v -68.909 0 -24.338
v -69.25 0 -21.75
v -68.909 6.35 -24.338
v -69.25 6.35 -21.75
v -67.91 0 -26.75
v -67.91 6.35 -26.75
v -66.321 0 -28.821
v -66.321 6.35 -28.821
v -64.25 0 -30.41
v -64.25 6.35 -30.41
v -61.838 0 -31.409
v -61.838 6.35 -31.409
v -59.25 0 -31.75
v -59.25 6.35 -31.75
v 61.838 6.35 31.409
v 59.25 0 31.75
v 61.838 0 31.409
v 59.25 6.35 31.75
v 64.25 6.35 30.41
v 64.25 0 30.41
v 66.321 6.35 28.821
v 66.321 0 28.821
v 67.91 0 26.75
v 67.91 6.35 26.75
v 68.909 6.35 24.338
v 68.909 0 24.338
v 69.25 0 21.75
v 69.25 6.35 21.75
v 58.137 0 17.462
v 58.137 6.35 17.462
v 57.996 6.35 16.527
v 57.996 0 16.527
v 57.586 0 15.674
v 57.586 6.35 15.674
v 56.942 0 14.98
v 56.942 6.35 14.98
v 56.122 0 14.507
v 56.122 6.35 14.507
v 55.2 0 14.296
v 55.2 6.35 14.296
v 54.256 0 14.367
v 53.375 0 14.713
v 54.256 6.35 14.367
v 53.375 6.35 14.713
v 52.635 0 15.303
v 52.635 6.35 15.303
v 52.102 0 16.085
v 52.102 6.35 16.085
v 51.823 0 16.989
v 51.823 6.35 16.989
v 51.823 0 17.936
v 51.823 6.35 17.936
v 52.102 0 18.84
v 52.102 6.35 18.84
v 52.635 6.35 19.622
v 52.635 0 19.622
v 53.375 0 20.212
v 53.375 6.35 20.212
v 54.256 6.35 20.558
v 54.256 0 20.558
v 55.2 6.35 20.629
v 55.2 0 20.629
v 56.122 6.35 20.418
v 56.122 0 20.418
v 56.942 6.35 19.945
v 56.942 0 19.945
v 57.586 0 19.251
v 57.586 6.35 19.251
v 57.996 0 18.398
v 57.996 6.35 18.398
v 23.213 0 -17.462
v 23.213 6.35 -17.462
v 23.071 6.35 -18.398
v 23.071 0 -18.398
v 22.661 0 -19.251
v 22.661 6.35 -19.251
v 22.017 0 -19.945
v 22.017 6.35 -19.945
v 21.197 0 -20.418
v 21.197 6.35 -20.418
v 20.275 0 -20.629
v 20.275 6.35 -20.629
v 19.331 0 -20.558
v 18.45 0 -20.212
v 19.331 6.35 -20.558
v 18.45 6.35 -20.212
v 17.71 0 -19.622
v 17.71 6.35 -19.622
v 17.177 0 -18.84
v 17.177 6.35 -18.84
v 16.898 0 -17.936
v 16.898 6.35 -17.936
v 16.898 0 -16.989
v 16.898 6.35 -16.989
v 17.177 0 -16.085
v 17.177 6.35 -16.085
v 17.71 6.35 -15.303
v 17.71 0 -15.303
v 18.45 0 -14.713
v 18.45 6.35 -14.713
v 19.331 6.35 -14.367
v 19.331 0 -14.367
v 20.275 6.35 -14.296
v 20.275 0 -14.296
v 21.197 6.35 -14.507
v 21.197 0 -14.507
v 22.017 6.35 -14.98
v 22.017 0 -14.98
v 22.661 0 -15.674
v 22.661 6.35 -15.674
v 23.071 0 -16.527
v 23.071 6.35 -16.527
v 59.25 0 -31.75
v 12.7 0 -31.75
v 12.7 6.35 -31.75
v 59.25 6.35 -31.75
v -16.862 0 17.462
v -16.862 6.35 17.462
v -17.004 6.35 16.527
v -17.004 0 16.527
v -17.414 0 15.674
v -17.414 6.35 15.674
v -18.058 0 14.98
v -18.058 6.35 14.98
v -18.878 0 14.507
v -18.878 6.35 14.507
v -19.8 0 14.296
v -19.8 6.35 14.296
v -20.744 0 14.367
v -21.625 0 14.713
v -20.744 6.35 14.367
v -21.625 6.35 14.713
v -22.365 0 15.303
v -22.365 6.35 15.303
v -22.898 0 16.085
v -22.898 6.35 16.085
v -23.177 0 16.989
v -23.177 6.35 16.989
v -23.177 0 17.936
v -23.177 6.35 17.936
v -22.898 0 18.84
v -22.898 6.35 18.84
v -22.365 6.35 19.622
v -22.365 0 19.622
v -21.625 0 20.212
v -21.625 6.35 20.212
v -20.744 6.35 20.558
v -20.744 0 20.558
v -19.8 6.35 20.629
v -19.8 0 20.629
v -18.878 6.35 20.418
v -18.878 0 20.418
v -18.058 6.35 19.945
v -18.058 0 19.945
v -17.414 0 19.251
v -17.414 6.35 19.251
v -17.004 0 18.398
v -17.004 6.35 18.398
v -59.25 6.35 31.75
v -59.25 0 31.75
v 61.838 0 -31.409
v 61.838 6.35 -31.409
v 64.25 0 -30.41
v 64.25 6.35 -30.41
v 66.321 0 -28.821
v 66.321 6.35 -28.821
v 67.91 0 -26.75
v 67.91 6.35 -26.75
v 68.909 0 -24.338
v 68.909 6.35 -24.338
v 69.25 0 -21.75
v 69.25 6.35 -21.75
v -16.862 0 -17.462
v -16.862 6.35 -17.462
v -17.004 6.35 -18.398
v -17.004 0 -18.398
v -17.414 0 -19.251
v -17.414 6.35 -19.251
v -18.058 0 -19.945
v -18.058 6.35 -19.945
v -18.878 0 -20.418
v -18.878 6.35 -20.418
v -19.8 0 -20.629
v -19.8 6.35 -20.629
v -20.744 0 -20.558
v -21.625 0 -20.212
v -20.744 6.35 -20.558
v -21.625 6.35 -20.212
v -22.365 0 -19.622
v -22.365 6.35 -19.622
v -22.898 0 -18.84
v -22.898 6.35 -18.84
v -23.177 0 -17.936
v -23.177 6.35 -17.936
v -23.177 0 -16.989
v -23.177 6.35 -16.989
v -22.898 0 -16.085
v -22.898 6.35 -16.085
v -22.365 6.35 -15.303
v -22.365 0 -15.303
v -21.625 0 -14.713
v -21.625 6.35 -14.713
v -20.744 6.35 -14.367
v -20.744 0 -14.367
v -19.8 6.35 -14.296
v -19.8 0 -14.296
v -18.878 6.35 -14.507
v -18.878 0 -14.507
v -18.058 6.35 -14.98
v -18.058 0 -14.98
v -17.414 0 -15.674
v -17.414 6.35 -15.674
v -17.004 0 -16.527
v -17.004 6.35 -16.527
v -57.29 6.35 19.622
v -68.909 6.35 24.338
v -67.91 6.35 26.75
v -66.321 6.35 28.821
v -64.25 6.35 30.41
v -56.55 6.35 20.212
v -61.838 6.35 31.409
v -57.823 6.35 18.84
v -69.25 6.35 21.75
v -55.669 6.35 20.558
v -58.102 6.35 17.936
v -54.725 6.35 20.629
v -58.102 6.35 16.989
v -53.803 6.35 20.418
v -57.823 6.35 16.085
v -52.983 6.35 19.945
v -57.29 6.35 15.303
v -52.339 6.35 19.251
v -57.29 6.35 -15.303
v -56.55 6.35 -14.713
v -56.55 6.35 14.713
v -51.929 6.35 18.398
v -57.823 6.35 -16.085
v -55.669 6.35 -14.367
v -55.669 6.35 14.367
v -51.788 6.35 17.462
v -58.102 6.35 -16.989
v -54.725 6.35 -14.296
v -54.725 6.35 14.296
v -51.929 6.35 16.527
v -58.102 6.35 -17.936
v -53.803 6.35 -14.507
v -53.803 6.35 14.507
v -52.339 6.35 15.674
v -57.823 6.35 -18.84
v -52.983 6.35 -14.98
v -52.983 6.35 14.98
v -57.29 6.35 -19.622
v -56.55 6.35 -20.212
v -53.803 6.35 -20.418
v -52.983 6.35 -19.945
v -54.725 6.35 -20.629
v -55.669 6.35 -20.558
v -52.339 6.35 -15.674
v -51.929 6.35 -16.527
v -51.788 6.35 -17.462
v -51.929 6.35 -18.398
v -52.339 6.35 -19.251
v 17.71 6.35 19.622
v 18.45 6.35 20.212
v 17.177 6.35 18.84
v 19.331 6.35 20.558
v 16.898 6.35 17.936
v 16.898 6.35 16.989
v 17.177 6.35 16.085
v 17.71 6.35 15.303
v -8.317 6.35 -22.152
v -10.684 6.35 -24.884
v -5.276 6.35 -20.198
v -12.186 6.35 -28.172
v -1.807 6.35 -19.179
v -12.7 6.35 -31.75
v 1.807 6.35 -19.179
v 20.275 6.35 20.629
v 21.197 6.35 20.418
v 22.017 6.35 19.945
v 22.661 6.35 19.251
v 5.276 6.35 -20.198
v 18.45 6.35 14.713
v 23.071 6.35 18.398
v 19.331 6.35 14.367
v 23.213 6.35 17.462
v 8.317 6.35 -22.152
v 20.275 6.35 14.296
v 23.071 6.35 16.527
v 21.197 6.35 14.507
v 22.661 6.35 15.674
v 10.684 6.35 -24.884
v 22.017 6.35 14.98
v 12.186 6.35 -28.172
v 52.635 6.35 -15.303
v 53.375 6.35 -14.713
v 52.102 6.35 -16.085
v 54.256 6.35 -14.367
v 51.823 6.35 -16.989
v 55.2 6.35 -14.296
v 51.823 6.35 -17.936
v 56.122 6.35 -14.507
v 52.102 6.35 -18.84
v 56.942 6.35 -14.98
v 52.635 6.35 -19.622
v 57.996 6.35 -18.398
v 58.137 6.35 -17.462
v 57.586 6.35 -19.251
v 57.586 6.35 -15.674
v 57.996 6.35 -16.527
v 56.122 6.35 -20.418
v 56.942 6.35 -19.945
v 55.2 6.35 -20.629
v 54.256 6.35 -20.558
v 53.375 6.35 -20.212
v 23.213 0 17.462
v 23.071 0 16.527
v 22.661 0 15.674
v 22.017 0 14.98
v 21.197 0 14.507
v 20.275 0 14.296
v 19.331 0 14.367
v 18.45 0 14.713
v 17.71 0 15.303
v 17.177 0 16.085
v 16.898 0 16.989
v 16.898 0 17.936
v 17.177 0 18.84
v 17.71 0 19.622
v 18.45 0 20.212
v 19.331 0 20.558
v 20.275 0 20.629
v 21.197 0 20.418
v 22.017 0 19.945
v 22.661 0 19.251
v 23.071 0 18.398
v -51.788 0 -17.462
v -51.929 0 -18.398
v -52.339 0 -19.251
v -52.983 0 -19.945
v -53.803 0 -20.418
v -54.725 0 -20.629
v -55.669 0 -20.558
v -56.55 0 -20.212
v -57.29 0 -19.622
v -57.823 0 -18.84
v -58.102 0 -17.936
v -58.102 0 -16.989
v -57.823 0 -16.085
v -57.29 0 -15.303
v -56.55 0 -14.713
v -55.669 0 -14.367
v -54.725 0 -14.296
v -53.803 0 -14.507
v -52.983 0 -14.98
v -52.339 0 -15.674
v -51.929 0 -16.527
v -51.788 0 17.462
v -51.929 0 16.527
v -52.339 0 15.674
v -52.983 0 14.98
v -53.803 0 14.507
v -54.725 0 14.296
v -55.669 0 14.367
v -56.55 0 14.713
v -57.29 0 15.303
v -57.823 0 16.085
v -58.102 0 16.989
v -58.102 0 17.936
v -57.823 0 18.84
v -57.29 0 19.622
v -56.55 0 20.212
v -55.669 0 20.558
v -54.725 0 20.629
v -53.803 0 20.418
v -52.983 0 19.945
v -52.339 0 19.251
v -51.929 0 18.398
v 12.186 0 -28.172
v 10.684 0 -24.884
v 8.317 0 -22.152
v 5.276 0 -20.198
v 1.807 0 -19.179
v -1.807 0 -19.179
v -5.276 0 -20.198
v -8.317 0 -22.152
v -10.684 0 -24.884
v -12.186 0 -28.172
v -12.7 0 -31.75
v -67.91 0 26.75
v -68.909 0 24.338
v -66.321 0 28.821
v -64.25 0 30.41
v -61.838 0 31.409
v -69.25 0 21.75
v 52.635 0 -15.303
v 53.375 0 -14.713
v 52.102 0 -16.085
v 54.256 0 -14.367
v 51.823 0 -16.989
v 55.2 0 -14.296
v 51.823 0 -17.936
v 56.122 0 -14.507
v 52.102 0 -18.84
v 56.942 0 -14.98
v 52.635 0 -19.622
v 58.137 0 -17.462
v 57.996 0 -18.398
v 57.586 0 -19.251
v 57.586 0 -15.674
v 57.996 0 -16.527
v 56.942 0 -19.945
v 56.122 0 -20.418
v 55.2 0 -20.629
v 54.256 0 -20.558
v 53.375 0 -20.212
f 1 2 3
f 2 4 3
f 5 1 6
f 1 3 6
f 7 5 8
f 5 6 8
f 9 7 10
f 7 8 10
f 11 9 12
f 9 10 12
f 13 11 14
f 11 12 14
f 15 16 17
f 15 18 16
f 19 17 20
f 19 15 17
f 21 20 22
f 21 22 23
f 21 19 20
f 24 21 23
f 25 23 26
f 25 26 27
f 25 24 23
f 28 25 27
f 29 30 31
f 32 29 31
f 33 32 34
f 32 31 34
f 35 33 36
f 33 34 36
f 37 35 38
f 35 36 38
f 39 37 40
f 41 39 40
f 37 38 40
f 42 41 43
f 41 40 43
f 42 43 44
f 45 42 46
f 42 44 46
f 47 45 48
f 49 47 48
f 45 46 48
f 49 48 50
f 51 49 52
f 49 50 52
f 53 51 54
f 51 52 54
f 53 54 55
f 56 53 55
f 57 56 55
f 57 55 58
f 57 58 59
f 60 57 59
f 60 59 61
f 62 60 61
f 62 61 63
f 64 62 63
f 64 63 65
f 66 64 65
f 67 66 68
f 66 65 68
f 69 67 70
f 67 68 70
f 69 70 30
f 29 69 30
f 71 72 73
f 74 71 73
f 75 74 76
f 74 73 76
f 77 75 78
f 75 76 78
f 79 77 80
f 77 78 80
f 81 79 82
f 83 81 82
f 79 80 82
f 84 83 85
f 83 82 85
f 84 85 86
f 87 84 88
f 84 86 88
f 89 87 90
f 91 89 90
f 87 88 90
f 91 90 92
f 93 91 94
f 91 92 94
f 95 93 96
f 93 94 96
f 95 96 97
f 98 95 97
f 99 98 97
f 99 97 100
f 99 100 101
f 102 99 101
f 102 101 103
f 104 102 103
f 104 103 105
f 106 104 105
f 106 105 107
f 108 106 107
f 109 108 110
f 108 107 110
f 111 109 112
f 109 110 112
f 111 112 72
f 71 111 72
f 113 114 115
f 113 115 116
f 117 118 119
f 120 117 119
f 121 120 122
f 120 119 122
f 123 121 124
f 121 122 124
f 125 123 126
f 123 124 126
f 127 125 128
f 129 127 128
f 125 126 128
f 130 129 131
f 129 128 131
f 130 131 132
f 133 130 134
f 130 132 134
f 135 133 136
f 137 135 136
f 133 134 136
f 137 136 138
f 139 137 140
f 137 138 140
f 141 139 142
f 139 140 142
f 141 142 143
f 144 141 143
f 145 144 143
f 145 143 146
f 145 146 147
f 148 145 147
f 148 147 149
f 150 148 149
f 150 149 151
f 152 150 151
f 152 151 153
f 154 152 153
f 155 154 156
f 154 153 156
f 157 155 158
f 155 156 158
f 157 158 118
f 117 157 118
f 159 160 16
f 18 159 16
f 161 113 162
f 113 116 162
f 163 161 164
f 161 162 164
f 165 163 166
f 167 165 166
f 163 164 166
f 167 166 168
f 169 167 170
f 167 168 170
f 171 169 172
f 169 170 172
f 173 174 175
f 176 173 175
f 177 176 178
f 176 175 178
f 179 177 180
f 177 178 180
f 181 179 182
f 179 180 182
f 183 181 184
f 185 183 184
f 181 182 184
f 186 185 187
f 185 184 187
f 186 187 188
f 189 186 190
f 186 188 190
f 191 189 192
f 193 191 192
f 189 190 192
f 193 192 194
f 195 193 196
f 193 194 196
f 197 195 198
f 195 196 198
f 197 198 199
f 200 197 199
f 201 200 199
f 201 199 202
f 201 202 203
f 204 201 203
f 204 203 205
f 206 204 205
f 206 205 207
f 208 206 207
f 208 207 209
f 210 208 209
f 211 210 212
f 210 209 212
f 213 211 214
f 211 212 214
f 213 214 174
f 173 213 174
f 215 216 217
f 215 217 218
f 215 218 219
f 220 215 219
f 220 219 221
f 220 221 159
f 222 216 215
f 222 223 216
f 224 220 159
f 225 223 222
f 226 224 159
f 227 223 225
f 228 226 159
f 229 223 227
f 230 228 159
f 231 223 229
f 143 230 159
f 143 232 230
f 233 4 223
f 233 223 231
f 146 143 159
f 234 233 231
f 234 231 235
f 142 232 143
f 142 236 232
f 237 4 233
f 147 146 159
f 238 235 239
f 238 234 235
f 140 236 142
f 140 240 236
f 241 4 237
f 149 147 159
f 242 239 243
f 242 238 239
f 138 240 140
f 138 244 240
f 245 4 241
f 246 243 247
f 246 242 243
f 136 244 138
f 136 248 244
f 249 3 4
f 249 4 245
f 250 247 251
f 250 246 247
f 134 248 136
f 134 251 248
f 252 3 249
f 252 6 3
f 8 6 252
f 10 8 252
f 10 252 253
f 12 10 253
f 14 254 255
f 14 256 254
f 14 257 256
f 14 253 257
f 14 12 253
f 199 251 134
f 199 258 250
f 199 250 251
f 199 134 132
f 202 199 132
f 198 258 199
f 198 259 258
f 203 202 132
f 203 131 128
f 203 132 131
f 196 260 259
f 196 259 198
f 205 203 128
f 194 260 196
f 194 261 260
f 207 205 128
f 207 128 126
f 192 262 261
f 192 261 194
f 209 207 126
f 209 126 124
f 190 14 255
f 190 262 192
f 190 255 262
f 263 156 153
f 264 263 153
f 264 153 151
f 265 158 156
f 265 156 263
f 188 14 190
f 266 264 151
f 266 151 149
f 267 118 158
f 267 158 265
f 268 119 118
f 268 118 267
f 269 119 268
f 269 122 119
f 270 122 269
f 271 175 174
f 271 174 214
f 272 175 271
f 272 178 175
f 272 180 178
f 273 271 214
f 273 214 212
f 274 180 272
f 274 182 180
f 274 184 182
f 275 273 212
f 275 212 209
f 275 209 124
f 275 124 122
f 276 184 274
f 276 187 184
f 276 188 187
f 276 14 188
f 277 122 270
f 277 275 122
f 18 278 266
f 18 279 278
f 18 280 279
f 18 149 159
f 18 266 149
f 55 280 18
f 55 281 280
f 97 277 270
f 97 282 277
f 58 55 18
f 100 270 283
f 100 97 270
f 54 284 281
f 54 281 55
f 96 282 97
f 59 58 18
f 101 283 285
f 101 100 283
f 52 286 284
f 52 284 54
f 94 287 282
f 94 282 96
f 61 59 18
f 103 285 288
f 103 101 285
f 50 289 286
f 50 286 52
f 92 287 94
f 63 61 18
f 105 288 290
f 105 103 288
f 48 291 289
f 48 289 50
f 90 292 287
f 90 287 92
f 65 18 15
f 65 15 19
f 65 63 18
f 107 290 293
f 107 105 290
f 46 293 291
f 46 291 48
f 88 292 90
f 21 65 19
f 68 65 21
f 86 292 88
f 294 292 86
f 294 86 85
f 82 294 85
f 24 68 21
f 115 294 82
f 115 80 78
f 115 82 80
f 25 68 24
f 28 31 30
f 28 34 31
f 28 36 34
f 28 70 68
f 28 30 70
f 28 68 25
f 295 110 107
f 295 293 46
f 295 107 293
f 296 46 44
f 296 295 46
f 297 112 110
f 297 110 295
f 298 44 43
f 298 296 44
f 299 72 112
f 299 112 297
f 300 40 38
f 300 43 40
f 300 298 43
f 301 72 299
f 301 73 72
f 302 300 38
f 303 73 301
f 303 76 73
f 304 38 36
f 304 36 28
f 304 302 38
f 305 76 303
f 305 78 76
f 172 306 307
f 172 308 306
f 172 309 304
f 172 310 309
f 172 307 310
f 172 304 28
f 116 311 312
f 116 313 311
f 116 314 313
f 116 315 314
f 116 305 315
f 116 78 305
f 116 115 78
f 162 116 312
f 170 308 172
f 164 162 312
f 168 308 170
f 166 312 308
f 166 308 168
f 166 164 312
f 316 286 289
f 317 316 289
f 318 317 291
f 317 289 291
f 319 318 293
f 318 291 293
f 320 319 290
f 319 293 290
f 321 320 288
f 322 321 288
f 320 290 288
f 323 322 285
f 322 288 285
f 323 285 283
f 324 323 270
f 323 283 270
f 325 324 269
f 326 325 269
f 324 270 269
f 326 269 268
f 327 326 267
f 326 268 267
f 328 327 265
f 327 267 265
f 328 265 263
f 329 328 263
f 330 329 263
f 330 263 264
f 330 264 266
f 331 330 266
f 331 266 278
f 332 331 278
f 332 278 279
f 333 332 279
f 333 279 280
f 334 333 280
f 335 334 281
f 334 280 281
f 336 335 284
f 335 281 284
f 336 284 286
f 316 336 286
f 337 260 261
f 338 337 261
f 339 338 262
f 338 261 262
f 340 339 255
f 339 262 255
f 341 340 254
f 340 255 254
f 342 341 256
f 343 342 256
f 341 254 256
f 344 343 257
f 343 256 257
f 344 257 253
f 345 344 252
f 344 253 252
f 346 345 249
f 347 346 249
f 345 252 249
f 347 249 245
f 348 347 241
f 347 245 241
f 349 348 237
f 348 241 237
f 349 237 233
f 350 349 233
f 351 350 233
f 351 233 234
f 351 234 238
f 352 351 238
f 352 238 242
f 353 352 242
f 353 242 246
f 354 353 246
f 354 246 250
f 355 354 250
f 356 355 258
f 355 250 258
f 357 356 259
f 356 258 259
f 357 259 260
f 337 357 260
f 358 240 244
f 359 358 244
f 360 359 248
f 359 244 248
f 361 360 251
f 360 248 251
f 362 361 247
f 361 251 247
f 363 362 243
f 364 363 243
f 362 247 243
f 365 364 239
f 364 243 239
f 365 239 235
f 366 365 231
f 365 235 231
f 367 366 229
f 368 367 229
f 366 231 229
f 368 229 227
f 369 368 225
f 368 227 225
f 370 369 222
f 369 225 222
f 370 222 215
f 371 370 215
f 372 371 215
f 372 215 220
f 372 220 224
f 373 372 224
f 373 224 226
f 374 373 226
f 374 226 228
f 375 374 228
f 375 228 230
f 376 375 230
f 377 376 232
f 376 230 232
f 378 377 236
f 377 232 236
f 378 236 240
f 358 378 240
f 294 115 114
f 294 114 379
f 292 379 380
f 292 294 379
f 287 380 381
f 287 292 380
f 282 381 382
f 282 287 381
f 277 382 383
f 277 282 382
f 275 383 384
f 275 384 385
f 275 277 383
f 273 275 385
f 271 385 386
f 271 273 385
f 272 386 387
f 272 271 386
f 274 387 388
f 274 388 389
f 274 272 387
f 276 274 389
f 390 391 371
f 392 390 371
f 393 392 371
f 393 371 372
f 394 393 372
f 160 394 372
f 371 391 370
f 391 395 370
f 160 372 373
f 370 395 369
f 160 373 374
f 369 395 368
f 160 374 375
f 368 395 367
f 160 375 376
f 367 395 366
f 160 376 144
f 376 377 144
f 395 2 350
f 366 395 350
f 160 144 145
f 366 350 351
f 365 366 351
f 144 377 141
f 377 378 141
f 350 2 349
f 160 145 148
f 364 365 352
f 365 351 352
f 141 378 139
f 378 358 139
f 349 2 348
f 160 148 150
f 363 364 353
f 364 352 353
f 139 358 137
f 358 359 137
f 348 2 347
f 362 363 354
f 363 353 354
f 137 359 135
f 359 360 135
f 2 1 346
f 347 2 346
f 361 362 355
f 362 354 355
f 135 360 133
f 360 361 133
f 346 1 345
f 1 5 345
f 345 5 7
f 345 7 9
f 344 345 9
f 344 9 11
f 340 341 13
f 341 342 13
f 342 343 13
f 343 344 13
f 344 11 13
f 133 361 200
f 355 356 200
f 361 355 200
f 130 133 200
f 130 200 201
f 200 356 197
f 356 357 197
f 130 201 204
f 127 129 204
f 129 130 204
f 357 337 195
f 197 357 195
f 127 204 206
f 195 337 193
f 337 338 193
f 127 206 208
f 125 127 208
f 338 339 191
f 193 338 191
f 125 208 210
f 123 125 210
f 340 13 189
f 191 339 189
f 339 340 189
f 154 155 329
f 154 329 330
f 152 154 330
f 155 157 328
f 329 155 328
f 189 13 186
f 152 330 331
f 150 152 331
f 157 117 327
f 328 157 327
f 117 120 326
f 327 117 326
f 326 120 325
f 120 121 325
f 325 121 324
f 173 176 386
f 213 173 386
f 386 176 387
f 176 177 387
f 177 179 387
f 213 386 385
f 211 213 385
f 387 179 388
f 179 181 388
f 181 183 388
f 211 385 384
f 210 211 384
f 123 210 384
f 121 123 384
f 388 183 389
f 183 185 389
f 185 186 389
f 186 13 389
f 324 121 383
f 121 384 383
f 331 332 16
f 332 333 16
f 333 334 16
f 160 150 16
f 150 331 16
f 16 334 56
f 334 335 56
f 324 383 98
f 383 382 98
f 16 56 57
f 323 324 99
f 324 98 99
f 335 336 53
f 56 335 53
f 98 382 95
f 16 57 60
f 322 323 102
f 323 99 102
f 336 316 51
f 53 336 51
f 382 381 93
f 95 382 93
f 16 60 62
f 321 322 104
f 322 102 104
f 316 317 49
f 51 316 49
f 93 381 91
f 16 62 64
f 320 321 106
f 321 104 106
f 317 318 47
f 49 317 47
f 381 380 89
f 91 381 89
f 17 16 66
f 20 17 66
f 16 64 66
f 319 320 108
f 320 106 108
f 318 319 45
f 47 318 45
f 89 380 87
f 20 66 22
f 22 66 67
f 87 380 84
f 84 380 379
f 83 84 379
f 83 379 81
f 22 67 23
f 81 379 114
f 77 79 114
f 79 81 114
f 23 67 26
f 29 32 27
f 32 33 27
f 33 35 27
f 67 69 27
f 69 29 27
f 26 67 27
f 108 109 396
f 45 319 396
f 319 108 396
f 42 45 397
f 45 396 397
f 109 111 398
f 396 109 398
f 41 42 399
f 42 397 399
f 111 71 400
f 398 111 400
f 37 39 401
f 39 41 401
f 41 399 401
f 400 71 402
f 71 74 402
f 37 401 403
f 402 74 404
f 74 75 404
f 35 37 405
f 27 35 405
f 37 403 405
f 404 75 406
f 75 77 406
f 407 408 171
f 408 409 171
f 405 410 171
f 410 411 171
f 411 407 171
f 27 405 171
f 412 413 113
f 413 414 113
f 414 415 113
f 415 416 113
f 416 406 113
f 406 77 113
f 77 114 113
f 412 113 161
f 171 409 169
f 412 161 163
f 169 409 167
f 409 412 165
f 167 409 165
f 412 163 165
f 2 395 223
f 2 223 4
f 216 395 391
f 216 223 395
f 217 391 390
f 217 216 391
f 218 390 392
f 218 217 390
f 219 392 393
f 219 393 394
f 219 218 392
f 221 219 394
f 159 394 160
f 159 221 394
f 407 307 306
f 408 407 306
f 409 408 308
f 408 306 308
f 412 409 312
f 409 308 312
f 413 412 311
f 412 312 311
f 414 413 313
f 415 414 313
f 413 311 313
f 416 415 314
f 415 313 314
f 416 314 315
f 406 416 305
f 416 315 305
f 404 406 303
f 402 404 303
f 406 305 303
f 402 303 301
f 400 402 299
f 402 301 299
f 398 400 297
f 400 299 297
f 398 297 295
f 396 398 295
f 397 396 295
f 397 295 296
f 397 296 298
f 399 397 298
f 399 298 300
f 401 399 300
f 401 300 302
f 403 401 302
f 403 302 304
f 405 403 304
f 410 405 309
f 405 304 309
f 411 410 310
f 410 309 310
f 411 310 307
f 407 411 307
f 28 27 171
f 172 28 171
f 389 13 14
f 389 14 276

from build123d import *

# Parameters (mm, degrees)
SKETCH1_W           = 138.5
SKETCH1_H           = 63.5
BOSS_EXTRUDE1_DEPTH = 6.35
SKETCH2_R           = 3.175
CUT_EXTRUDE1_DEPTH  = 6.35
FILLET1_R           = 10
CUT_EXTRUDE4_DEPTH  = 6.35


with BuildPart() as part:
    # Sketch1 → Boss-Extrude1 (new body)
    with BuildSketch(Plane(origin=(0, 0, 0), x_dir=(1, 0, 0), z_dir=(0, 1, 0))):
        Rectangle(SKETCH1_W, SKETCH1_H)
    extrude(amount=BOSS_EXTRUDE1_DEPTH)

    # Sketch2 → Cut-Extrude1 (cut)
    with BuildSketch(Plane(origin=(0, 6.35, 0), x_dir=(1, 0, 0), z_dir=(0, 1, 0))):
        with Locations((-54.9625, 17.4625)):
            Circle(SKETCH2_R)
        with Locations((-20.0375, 17.4625)):
            Circle(SKETCH2_R)
        with Locations((20.0375, 17.4625)):
            Circle(SKETCH2_R)
        with Locations((54.9625, 17.4625)):
            Circle(SKETCH2_R)
        with Locations((54.9625, -17.4625)):
            Circle(SKETCH2_R)
        with Locations((20.0375, -17.4625)):
            Circle(SKETCH2_R)
        with Locations((-20.0375, -17.4625)):
            Circle(SKETCH2_R)
        with Locations((-54.9625, -17.4625)):
            Circle(SKETCH2_R)
    extrude(amount=-CUT_EXTRUDE1_DEPTH, mode=Mode.SUBTRACT)

    # Fillet1
    fillet1_edges = [part.edges().sort_by_distance(p)[0] for p in [
        (69.25, 3.175, 31.75),
        (-69.25, 3.175, 31.75),
        (-69.25, 3.175, -31.75),
        (69.25, 3.175, -31.75),
    ]]
    fillet(fillet1_edges, radius=FILLET1_R)

    # Sketch3 → Cut-Extrude4 (cut)
    with BuildSketch(Plane(origin=(0, 6.35, 0), x_dir=(1, 0, 0), z_dir=(0, 1, 0))):
        with BuildLine():
            Line((-12.7, 31.75), (12.7, 31.75))
            ThreePointArc((12.7, 31.75), (0, 19.05), (-12.7, 31.75))
        make_face()
    extrude(amount=-CUT_EXTRUDE4_DEPTH, mode=Mode.SUBTRACT)


solid = part.part
